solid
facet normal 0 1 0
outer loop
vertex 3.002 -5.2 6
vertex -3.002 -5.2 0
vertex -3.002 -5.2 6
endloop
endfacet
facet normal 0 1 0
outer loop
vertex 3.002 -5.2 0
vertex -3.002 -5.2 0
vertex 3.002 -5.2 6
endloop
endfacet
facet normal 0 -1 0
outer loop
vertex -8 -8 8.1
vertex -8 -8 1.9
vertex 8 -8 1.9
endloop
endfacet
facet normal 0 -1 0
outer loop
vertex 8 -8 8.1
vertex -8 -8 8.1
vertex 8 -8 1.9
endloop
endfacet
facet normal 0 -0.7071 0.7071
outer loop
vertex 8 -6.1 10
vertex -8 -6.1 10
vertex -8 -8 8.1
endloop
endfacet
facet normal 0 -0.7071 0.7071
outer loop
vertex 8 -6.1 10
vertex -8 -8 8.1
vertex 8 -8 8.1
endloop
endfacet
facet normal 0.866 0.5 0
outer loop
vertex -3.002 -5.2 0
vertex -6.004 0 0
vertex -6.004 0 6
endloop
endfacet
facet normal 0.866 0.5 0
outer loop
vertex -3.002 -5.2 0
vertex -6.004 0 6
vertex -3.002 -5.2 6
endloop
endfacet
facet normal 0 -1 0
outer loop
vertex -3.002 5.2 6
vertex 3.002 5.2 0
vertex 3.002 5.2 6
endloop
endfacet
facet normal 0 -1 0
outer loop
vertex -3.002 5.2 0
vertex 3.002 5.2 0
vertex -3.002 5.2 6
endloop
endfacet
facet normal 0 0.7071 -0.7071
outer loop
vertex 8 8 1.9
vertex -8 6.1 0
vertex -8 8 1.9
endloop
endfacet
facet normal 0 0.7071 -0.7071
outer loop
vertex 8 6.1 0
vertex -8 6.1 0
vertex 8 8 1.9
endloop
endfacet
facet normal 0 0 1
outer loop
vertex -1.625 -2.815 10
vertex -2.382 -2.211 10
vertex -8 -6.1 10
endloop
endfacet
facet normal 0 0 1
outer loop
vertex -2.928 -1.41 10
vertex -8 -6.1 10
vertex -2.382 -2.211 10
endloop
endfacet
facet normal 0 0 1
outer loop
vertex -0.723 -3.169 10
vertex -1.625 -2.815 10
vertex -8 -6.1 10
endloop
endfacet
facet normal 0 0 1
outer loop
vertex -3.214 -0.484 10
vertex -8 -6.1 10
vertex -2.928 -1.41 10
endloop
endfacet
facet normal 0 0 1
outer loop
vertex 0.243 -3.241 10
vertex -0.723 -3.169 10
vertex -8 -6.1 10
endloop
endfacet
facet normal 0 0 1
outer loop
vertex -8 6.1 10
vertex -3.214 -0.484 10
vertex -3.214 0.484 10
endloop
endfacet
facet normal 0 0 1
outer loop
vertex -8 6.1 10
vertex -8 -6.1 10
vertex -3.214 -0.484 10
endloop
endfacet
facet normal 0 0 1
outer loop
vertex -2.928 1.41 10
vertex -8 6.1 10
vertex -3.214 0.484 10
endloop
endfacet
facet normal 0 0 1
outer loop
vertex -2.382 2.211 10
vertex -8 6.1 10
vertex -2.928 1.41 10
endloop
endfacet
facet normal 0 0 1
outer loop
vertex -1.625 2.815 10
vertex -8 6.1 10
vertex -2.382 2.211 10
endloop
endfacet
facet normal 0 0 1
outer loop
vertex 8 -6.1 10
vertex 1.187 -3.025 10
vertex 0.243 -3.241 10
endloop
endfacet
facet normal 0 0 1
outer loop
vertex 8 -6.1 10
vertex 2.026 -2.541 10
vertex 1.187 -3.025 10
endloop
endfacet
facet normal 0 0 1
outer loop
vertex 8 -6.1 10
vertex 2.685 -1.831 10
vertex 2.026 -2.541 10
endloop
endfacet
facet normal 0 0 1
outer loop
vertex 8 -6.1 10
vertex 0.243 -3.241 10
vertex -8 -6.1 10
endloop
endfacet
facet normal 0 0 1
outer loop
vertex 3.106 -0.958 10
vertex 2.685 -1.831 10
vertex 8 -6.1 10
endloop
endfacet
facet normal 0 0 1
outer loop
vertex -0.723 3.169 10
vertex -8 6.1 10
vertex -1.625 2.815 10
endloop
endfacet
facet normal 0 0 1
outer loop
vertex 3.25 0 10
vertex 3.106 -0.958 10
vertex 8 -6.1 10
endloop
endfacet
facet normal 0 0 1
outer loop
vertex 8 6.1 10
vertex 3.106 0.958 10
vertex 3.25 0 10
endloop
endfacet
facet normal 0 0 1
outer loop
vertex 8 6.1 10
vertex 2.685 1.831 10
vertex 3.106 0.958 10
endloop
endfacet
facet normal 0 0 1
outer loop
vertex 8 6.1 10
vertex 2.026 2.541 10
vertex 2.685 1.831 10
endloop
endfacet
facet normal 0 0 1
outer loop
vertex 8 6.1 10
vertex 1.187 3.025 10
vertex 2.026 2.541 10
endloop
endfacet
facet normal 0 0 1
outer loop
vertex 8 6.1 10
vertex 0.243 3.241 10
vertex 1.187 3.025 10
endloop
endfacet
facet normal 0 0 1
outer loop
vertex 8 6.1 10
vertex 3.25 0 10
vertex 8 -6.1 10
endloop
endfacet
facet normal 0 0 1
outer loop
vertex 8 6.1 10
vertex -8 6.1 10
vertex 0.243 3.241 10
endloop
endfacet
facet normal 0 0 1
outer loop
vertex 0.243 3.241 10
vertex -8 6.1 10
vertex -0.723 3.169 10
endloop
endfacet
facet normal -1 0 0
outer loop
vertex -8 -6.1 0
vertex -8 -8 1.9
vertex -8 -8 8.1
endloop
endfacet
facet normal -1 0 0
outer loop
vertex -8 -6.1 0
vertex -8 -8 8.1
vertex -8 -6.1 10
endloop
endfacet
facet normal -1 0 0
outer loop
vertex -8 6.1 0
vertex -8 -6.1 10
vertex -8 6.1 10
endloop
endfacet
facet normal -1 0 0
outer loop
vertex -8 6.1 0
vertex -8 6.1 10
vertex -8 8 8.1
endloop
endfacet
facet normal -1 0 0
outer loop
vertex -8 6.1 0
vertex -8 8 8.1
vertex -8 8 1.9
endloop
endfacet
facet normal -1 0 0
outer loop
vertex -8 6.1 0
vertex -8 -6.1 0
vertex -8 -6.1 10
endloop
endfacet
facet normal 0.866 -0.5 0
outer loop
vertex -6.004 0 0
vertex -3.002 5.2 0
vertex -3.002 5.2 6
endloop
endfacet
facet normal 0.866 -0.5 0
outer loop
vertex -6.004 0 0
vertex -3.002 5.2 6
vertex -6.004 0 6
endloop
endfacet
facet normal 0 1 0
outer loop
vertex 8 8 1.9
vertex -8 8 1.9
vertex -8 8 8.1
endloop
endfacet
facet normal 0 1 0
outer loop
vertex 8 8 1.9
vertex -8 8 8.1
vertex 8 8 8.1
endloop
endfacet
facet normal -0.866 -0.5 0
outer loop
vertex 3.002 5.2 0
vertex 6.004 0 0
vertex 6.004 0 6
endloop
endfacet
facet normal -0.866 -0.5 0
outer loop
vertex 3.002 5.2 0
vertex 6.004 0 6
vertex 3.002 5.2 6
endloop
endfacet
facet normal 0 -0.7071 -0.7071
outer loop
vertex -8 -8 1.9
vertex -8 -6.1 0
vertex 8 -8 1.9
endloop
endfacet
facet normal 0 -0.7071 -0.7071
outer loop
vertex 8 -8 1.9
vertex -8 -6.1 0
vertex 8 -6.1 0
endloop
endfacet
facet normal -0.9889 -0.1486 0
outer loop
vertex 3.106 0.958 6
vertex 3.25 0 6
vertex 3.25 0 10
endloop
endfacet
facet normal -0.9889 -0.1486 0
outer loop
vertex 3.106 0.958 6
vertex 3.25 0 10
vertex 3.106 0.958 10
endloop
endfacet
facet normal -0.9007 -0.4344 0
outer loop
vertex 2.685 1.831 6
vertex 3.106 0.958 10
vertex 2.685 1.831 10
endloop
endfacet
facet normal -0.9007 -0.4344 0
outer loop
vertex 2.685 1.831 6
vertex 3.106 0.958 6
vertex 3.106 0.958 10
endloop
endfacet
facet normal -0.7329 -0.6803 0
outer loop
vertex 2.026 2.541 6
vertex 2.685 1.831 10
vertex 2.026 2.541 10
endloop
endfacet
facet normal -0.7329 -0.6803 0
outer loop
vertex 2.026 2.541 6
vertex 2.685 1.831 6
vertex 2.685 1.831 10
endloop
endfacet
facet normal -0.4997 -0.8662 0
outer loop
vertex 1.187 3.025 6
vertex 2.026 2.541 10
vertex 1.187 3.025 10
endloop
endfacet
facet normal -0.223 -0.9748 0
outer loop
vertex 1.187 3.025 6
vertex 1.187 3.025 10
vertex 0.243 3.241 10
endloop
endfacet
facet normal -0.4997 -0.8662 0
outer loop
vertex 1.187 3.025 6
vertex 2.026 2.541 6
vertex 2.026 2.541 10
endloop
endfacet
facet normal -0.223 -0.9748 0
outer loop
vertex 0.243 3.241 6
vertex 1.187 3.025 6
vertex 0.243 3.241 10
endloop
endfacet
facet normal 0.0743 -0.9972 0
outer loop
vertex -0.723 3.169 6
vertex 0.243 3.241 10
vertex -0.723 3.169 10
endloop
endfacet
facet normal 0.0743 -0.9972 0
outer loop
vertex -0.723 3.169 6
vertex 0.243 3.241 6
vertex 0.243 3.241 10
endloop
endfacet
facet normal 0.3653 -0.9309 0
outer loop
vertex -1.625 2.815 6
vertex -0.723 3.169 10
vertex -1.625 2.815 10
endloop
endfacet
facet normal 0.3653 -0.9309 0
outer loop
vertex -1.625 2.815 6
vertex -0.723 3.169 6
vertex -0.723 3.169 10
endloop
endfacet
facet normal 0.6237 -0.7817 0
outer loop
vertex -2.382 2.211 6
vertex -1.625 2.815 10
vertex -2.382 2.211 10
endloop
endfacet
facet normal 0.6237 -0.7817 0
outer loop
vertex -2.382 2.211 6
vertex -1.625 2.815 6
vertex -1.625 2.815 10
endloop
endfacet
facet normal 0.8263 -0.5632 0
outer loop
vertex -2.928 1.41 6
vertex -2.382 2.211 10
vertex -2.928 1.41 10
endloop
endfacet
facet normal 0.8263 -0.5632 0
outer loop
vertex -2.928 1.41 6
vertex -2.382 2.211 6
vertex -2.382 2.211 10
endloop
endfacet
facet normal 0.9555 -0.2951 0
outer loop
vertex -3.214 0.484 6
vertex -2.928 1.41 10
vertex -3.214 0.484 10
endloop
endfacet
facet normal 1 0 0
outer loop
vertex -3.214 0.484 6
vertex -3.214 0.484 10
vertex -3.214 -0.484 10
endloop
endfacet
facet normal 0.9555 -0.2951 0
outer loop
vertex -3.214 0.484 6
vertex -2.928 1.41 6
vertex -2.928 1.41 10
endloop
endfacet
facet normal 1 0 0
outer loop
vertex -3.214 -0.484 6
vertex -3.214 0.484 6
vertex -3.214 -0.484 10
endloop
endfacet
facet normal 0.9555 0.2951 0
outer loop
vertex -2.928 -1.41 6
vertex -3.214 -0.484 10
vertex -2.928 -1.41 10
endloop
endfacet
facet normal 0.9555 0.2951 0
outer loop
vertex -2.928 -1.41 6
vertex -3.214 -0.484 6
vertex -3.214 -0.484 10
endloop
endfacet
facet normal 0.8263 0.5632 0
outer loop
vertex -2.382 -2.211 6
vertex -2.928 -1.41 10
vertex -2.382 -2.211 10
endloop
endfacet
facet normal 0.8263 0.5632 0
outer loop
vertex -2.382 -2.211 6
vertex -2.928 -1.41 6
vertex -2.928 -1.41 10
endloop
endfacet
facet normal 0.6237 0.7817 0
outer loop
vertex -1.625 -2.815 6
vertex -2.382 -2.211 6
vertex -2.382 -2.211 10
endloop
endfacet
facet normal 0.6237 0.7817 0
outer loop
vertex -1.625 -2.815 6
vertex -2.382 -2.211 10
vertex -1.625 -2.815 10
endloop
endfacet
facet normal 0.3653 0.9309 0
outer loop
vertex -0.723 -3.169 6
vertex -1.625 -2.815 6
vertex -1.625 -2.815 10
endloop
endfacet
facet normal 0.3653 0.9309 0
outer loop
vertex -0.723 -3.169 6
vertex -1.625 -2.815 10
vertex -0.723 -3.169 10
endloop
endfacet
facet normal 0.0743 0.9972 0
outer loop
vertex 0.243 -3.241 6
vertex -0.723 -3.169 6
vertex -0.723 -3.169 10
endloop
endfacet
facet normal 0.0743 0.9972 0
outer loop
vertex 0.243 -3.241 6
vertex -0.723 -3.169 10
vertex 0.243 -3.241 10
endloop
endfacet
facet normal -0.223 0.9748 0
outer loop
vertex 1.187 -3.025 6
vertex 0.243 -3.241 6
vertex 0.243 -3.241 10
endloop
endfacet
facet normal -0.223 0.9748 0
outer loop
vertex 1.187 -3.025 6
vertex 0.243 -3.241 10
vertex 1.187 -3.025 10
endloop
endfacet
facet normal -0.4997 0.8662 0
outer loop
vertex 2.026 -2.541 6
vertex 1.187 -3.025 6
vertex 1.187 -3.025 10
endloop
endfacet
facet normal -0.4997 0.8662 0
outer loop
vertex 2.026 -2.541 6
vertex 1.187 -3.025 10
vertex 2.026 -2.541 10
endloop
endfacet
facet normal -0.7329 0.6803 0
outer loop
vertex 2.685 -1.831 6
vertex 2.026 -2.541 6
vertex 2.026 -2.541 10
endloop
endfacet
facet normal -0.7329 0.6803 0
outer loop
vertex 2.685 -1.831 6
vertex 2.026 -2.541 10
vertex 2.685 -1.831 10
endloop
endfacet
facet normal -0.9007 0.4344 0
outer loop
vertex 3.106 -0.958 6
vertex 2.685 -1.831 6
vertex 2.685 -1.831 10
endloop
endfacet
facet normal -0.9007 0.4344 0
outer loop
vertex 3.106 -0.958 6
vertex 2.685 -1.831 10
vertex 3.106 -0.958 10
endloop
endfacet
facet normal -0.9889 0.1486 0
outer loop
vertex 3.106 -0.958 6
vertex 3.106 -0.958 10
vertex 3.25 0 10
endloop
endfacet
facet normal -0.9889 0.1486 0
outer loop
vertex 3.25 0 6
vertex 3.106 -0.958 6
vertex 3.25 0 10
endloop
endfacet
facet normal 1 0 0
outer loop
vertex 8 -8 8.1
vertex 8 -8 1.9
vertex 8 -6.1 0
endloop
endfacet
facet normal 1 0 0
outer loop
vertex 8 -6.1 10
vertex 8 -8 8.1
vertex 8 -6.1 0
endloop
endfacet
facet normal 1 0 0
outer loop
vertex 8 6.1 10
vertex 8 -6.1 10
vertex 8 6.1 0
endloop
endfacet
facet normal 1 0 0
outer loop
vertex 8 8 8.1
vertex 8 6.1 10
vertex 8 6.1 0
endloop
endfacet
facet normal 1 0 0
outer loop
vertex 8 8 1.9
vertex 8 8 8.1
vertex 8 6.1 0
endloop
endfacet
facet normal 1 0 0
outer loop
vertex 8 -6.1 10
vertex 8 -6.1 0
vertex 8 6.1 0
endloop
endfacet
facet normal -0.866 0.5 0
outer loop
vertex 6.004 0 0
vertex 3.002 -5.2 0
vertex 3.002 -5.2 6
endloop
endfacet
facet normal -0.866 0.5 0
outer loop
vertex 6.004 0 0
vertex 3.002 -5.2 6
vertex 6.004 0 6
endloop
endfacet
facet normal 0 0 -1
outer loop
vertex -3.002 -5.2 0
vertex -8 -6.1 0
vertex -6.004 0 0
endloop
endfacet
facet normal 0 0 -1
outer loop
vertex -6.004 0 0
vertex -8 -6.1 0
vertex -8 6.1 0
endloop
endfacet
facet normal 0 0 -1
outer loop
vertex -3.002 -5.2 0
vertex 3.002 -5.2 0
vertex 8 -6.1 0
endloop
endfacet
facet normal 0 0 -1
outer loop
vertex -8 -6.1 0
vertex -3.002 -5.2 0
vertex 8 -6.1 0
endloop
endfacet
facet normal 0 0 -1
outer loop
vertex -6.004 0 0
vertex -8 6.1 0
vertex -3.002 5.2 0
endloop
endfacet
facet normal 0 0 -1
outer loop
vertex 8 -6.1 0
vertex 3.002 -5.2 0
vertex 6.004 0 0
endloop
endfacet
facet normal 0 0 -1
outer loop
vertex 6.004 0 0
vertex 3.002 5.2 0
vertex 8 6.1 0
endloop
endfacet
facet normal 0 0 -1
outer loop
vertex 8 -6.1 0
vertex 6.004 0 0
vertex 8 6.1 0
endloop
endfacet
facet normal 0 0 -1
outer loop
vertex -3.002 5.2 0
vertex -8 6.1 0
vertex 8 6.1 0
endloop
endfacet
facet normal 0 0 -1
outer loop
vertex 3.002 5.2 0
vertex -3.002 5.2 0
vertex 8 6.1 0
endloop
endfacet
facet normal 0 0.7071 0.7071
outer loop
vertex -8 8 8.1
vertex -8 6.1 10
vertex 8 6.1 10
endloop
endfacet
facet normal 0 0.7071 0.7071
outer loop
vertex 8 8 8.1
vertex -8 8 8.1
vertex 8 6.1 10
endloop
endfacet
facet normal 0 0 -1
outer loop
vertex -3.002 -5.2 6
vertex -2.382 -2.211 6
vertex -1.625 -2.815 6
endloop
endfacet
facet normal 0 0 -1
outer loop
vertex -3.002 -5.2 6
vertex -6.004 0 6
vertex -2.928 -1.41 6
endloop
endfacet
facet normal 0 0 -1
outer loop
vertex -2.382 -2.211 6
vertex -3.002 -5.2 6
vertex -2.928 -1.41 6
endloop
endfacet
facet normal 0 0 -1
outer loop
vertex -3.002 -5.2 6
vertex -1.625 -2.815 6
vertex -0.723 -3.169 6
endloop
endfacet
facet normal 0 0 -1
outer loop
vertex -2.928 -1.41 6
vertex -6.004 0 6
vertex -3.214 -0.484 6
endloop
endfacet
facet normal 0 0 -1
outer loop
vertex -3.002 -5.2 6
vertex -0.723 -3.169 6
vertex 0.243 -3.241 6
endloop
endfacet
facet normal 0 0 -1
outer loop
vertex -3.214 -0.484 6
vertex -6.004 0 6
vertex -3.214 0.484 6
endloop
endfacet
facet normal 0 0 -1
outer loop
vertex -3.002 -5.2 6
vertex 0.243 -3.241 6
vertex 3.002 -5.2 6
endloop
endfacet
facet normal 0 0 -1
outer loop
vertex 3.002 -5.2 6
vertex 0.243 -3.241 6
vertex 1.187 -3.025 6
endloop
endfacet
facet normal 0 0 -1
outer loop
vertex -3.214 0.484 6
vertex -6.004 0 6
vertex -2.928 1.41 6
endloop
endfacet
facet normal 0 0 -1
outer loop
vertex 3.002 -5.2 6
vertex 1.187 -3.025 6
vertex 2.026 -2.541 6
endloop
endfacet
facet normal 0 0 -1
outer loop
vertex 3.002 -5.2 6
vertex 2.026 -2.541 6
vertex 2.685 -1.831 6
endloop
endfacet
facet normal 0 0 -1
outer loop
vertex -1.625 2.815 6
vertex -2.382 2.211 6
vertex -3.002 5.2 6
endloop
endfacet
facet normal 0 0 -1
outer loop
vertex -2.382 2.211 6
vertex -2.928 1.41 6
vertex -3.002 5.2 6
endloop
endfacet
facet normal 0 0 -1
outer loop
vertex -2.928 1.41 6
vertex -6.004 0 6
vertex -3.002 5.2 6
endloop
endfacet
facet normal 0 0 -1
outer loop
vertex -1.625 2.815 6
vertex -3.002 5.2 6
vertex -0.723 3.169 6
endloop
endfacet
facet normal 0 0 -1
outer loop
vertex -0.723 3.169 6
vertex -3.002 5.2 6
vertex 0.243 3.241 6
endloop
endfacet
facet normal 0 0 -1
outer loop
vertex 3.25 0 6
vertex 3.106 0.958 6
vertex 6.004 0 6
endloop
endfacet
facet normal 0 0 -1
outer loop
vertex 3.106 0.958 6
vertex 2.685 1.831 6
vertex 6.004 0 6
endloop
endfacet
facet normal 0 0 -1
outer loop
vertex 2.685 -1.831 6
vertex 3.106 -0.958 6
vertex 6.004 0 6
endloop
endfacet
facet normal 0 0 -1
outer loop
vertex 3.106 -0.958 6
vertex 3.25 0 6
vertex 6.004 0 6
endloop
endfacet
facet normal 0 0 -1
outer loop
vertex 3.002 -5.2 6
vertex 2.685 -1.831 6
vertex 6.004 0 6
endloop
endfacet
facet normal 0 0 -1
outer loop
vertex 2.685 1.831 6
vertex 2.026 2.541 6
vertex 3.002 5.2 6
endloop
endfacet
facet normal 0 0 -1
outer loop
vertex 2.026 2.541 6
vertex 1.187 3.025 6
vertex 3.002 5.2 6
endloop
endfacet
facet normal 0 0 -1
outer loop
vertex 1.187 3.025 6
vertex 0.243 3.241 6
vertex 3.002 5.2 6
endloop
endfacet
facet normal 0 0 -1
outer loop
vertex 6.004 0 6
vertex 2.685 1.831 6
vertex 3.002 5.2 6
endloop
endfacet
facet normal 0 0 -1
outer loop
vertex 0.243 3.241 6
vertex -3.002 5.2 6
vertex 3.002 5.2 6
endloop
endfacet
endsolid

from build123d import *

# Parameters (mm, degrees)
F0_W     = 16
F0_H     = 16
F0_R     = 3.25
F1_DEPTH = 10
F2_DEPTH = 6
F3_SIZE  = 1.9


with BuildPart() as f1:
    # F0 (on Top) → F1 (new body)
    with BuildSketch(Plane.XY):
        Rectangle(F0_W, F0_H)
        Polygon((-6.004443, 0), (-3.002221, 5.2), (3.002221, 5.2), (6.004443, 0), (3.002221, -5.2), (-3.002221, -5.2), align=None, mode=Mode.SUBTRACT)
        Polygon((3.002221, 5.2), (-3.002221, 5.2), (-6.004443, 0), (-3.002221, -5.2), (3.002221, -5.2), (6.004443, 0), align=None)
        Circle(F0_R, mode=Mode.SUBTRACT)
    extrude(amount=F1_DEPTH)

    # F0 (on Top) → F2 (cut)
    with BuildSketch(Plane.XY):
        Polygon((3.002221, 5.2), (-3.002221, 5.2), (-6.004443, 0), (-3.002221, -5.2), (3.002221, -5.2), (6.004443, 0), align=None)
        Circle(F0_R, mode=Mode.SUBTRACT)
    extrude(amount=F2_DEPTH, mode=Mode.SUBTRACT)

    # F3
    f3_edges = [f1.edges().sort_by_distance(p)[0] for p in [
        (0, 8, 0),
        (0, -8, 0),
        (0, 8, 10),
        (0, -8, 10),
    ]]
    chamfer(f3_edges, length=F3_SIZE)


solid = f1.part
